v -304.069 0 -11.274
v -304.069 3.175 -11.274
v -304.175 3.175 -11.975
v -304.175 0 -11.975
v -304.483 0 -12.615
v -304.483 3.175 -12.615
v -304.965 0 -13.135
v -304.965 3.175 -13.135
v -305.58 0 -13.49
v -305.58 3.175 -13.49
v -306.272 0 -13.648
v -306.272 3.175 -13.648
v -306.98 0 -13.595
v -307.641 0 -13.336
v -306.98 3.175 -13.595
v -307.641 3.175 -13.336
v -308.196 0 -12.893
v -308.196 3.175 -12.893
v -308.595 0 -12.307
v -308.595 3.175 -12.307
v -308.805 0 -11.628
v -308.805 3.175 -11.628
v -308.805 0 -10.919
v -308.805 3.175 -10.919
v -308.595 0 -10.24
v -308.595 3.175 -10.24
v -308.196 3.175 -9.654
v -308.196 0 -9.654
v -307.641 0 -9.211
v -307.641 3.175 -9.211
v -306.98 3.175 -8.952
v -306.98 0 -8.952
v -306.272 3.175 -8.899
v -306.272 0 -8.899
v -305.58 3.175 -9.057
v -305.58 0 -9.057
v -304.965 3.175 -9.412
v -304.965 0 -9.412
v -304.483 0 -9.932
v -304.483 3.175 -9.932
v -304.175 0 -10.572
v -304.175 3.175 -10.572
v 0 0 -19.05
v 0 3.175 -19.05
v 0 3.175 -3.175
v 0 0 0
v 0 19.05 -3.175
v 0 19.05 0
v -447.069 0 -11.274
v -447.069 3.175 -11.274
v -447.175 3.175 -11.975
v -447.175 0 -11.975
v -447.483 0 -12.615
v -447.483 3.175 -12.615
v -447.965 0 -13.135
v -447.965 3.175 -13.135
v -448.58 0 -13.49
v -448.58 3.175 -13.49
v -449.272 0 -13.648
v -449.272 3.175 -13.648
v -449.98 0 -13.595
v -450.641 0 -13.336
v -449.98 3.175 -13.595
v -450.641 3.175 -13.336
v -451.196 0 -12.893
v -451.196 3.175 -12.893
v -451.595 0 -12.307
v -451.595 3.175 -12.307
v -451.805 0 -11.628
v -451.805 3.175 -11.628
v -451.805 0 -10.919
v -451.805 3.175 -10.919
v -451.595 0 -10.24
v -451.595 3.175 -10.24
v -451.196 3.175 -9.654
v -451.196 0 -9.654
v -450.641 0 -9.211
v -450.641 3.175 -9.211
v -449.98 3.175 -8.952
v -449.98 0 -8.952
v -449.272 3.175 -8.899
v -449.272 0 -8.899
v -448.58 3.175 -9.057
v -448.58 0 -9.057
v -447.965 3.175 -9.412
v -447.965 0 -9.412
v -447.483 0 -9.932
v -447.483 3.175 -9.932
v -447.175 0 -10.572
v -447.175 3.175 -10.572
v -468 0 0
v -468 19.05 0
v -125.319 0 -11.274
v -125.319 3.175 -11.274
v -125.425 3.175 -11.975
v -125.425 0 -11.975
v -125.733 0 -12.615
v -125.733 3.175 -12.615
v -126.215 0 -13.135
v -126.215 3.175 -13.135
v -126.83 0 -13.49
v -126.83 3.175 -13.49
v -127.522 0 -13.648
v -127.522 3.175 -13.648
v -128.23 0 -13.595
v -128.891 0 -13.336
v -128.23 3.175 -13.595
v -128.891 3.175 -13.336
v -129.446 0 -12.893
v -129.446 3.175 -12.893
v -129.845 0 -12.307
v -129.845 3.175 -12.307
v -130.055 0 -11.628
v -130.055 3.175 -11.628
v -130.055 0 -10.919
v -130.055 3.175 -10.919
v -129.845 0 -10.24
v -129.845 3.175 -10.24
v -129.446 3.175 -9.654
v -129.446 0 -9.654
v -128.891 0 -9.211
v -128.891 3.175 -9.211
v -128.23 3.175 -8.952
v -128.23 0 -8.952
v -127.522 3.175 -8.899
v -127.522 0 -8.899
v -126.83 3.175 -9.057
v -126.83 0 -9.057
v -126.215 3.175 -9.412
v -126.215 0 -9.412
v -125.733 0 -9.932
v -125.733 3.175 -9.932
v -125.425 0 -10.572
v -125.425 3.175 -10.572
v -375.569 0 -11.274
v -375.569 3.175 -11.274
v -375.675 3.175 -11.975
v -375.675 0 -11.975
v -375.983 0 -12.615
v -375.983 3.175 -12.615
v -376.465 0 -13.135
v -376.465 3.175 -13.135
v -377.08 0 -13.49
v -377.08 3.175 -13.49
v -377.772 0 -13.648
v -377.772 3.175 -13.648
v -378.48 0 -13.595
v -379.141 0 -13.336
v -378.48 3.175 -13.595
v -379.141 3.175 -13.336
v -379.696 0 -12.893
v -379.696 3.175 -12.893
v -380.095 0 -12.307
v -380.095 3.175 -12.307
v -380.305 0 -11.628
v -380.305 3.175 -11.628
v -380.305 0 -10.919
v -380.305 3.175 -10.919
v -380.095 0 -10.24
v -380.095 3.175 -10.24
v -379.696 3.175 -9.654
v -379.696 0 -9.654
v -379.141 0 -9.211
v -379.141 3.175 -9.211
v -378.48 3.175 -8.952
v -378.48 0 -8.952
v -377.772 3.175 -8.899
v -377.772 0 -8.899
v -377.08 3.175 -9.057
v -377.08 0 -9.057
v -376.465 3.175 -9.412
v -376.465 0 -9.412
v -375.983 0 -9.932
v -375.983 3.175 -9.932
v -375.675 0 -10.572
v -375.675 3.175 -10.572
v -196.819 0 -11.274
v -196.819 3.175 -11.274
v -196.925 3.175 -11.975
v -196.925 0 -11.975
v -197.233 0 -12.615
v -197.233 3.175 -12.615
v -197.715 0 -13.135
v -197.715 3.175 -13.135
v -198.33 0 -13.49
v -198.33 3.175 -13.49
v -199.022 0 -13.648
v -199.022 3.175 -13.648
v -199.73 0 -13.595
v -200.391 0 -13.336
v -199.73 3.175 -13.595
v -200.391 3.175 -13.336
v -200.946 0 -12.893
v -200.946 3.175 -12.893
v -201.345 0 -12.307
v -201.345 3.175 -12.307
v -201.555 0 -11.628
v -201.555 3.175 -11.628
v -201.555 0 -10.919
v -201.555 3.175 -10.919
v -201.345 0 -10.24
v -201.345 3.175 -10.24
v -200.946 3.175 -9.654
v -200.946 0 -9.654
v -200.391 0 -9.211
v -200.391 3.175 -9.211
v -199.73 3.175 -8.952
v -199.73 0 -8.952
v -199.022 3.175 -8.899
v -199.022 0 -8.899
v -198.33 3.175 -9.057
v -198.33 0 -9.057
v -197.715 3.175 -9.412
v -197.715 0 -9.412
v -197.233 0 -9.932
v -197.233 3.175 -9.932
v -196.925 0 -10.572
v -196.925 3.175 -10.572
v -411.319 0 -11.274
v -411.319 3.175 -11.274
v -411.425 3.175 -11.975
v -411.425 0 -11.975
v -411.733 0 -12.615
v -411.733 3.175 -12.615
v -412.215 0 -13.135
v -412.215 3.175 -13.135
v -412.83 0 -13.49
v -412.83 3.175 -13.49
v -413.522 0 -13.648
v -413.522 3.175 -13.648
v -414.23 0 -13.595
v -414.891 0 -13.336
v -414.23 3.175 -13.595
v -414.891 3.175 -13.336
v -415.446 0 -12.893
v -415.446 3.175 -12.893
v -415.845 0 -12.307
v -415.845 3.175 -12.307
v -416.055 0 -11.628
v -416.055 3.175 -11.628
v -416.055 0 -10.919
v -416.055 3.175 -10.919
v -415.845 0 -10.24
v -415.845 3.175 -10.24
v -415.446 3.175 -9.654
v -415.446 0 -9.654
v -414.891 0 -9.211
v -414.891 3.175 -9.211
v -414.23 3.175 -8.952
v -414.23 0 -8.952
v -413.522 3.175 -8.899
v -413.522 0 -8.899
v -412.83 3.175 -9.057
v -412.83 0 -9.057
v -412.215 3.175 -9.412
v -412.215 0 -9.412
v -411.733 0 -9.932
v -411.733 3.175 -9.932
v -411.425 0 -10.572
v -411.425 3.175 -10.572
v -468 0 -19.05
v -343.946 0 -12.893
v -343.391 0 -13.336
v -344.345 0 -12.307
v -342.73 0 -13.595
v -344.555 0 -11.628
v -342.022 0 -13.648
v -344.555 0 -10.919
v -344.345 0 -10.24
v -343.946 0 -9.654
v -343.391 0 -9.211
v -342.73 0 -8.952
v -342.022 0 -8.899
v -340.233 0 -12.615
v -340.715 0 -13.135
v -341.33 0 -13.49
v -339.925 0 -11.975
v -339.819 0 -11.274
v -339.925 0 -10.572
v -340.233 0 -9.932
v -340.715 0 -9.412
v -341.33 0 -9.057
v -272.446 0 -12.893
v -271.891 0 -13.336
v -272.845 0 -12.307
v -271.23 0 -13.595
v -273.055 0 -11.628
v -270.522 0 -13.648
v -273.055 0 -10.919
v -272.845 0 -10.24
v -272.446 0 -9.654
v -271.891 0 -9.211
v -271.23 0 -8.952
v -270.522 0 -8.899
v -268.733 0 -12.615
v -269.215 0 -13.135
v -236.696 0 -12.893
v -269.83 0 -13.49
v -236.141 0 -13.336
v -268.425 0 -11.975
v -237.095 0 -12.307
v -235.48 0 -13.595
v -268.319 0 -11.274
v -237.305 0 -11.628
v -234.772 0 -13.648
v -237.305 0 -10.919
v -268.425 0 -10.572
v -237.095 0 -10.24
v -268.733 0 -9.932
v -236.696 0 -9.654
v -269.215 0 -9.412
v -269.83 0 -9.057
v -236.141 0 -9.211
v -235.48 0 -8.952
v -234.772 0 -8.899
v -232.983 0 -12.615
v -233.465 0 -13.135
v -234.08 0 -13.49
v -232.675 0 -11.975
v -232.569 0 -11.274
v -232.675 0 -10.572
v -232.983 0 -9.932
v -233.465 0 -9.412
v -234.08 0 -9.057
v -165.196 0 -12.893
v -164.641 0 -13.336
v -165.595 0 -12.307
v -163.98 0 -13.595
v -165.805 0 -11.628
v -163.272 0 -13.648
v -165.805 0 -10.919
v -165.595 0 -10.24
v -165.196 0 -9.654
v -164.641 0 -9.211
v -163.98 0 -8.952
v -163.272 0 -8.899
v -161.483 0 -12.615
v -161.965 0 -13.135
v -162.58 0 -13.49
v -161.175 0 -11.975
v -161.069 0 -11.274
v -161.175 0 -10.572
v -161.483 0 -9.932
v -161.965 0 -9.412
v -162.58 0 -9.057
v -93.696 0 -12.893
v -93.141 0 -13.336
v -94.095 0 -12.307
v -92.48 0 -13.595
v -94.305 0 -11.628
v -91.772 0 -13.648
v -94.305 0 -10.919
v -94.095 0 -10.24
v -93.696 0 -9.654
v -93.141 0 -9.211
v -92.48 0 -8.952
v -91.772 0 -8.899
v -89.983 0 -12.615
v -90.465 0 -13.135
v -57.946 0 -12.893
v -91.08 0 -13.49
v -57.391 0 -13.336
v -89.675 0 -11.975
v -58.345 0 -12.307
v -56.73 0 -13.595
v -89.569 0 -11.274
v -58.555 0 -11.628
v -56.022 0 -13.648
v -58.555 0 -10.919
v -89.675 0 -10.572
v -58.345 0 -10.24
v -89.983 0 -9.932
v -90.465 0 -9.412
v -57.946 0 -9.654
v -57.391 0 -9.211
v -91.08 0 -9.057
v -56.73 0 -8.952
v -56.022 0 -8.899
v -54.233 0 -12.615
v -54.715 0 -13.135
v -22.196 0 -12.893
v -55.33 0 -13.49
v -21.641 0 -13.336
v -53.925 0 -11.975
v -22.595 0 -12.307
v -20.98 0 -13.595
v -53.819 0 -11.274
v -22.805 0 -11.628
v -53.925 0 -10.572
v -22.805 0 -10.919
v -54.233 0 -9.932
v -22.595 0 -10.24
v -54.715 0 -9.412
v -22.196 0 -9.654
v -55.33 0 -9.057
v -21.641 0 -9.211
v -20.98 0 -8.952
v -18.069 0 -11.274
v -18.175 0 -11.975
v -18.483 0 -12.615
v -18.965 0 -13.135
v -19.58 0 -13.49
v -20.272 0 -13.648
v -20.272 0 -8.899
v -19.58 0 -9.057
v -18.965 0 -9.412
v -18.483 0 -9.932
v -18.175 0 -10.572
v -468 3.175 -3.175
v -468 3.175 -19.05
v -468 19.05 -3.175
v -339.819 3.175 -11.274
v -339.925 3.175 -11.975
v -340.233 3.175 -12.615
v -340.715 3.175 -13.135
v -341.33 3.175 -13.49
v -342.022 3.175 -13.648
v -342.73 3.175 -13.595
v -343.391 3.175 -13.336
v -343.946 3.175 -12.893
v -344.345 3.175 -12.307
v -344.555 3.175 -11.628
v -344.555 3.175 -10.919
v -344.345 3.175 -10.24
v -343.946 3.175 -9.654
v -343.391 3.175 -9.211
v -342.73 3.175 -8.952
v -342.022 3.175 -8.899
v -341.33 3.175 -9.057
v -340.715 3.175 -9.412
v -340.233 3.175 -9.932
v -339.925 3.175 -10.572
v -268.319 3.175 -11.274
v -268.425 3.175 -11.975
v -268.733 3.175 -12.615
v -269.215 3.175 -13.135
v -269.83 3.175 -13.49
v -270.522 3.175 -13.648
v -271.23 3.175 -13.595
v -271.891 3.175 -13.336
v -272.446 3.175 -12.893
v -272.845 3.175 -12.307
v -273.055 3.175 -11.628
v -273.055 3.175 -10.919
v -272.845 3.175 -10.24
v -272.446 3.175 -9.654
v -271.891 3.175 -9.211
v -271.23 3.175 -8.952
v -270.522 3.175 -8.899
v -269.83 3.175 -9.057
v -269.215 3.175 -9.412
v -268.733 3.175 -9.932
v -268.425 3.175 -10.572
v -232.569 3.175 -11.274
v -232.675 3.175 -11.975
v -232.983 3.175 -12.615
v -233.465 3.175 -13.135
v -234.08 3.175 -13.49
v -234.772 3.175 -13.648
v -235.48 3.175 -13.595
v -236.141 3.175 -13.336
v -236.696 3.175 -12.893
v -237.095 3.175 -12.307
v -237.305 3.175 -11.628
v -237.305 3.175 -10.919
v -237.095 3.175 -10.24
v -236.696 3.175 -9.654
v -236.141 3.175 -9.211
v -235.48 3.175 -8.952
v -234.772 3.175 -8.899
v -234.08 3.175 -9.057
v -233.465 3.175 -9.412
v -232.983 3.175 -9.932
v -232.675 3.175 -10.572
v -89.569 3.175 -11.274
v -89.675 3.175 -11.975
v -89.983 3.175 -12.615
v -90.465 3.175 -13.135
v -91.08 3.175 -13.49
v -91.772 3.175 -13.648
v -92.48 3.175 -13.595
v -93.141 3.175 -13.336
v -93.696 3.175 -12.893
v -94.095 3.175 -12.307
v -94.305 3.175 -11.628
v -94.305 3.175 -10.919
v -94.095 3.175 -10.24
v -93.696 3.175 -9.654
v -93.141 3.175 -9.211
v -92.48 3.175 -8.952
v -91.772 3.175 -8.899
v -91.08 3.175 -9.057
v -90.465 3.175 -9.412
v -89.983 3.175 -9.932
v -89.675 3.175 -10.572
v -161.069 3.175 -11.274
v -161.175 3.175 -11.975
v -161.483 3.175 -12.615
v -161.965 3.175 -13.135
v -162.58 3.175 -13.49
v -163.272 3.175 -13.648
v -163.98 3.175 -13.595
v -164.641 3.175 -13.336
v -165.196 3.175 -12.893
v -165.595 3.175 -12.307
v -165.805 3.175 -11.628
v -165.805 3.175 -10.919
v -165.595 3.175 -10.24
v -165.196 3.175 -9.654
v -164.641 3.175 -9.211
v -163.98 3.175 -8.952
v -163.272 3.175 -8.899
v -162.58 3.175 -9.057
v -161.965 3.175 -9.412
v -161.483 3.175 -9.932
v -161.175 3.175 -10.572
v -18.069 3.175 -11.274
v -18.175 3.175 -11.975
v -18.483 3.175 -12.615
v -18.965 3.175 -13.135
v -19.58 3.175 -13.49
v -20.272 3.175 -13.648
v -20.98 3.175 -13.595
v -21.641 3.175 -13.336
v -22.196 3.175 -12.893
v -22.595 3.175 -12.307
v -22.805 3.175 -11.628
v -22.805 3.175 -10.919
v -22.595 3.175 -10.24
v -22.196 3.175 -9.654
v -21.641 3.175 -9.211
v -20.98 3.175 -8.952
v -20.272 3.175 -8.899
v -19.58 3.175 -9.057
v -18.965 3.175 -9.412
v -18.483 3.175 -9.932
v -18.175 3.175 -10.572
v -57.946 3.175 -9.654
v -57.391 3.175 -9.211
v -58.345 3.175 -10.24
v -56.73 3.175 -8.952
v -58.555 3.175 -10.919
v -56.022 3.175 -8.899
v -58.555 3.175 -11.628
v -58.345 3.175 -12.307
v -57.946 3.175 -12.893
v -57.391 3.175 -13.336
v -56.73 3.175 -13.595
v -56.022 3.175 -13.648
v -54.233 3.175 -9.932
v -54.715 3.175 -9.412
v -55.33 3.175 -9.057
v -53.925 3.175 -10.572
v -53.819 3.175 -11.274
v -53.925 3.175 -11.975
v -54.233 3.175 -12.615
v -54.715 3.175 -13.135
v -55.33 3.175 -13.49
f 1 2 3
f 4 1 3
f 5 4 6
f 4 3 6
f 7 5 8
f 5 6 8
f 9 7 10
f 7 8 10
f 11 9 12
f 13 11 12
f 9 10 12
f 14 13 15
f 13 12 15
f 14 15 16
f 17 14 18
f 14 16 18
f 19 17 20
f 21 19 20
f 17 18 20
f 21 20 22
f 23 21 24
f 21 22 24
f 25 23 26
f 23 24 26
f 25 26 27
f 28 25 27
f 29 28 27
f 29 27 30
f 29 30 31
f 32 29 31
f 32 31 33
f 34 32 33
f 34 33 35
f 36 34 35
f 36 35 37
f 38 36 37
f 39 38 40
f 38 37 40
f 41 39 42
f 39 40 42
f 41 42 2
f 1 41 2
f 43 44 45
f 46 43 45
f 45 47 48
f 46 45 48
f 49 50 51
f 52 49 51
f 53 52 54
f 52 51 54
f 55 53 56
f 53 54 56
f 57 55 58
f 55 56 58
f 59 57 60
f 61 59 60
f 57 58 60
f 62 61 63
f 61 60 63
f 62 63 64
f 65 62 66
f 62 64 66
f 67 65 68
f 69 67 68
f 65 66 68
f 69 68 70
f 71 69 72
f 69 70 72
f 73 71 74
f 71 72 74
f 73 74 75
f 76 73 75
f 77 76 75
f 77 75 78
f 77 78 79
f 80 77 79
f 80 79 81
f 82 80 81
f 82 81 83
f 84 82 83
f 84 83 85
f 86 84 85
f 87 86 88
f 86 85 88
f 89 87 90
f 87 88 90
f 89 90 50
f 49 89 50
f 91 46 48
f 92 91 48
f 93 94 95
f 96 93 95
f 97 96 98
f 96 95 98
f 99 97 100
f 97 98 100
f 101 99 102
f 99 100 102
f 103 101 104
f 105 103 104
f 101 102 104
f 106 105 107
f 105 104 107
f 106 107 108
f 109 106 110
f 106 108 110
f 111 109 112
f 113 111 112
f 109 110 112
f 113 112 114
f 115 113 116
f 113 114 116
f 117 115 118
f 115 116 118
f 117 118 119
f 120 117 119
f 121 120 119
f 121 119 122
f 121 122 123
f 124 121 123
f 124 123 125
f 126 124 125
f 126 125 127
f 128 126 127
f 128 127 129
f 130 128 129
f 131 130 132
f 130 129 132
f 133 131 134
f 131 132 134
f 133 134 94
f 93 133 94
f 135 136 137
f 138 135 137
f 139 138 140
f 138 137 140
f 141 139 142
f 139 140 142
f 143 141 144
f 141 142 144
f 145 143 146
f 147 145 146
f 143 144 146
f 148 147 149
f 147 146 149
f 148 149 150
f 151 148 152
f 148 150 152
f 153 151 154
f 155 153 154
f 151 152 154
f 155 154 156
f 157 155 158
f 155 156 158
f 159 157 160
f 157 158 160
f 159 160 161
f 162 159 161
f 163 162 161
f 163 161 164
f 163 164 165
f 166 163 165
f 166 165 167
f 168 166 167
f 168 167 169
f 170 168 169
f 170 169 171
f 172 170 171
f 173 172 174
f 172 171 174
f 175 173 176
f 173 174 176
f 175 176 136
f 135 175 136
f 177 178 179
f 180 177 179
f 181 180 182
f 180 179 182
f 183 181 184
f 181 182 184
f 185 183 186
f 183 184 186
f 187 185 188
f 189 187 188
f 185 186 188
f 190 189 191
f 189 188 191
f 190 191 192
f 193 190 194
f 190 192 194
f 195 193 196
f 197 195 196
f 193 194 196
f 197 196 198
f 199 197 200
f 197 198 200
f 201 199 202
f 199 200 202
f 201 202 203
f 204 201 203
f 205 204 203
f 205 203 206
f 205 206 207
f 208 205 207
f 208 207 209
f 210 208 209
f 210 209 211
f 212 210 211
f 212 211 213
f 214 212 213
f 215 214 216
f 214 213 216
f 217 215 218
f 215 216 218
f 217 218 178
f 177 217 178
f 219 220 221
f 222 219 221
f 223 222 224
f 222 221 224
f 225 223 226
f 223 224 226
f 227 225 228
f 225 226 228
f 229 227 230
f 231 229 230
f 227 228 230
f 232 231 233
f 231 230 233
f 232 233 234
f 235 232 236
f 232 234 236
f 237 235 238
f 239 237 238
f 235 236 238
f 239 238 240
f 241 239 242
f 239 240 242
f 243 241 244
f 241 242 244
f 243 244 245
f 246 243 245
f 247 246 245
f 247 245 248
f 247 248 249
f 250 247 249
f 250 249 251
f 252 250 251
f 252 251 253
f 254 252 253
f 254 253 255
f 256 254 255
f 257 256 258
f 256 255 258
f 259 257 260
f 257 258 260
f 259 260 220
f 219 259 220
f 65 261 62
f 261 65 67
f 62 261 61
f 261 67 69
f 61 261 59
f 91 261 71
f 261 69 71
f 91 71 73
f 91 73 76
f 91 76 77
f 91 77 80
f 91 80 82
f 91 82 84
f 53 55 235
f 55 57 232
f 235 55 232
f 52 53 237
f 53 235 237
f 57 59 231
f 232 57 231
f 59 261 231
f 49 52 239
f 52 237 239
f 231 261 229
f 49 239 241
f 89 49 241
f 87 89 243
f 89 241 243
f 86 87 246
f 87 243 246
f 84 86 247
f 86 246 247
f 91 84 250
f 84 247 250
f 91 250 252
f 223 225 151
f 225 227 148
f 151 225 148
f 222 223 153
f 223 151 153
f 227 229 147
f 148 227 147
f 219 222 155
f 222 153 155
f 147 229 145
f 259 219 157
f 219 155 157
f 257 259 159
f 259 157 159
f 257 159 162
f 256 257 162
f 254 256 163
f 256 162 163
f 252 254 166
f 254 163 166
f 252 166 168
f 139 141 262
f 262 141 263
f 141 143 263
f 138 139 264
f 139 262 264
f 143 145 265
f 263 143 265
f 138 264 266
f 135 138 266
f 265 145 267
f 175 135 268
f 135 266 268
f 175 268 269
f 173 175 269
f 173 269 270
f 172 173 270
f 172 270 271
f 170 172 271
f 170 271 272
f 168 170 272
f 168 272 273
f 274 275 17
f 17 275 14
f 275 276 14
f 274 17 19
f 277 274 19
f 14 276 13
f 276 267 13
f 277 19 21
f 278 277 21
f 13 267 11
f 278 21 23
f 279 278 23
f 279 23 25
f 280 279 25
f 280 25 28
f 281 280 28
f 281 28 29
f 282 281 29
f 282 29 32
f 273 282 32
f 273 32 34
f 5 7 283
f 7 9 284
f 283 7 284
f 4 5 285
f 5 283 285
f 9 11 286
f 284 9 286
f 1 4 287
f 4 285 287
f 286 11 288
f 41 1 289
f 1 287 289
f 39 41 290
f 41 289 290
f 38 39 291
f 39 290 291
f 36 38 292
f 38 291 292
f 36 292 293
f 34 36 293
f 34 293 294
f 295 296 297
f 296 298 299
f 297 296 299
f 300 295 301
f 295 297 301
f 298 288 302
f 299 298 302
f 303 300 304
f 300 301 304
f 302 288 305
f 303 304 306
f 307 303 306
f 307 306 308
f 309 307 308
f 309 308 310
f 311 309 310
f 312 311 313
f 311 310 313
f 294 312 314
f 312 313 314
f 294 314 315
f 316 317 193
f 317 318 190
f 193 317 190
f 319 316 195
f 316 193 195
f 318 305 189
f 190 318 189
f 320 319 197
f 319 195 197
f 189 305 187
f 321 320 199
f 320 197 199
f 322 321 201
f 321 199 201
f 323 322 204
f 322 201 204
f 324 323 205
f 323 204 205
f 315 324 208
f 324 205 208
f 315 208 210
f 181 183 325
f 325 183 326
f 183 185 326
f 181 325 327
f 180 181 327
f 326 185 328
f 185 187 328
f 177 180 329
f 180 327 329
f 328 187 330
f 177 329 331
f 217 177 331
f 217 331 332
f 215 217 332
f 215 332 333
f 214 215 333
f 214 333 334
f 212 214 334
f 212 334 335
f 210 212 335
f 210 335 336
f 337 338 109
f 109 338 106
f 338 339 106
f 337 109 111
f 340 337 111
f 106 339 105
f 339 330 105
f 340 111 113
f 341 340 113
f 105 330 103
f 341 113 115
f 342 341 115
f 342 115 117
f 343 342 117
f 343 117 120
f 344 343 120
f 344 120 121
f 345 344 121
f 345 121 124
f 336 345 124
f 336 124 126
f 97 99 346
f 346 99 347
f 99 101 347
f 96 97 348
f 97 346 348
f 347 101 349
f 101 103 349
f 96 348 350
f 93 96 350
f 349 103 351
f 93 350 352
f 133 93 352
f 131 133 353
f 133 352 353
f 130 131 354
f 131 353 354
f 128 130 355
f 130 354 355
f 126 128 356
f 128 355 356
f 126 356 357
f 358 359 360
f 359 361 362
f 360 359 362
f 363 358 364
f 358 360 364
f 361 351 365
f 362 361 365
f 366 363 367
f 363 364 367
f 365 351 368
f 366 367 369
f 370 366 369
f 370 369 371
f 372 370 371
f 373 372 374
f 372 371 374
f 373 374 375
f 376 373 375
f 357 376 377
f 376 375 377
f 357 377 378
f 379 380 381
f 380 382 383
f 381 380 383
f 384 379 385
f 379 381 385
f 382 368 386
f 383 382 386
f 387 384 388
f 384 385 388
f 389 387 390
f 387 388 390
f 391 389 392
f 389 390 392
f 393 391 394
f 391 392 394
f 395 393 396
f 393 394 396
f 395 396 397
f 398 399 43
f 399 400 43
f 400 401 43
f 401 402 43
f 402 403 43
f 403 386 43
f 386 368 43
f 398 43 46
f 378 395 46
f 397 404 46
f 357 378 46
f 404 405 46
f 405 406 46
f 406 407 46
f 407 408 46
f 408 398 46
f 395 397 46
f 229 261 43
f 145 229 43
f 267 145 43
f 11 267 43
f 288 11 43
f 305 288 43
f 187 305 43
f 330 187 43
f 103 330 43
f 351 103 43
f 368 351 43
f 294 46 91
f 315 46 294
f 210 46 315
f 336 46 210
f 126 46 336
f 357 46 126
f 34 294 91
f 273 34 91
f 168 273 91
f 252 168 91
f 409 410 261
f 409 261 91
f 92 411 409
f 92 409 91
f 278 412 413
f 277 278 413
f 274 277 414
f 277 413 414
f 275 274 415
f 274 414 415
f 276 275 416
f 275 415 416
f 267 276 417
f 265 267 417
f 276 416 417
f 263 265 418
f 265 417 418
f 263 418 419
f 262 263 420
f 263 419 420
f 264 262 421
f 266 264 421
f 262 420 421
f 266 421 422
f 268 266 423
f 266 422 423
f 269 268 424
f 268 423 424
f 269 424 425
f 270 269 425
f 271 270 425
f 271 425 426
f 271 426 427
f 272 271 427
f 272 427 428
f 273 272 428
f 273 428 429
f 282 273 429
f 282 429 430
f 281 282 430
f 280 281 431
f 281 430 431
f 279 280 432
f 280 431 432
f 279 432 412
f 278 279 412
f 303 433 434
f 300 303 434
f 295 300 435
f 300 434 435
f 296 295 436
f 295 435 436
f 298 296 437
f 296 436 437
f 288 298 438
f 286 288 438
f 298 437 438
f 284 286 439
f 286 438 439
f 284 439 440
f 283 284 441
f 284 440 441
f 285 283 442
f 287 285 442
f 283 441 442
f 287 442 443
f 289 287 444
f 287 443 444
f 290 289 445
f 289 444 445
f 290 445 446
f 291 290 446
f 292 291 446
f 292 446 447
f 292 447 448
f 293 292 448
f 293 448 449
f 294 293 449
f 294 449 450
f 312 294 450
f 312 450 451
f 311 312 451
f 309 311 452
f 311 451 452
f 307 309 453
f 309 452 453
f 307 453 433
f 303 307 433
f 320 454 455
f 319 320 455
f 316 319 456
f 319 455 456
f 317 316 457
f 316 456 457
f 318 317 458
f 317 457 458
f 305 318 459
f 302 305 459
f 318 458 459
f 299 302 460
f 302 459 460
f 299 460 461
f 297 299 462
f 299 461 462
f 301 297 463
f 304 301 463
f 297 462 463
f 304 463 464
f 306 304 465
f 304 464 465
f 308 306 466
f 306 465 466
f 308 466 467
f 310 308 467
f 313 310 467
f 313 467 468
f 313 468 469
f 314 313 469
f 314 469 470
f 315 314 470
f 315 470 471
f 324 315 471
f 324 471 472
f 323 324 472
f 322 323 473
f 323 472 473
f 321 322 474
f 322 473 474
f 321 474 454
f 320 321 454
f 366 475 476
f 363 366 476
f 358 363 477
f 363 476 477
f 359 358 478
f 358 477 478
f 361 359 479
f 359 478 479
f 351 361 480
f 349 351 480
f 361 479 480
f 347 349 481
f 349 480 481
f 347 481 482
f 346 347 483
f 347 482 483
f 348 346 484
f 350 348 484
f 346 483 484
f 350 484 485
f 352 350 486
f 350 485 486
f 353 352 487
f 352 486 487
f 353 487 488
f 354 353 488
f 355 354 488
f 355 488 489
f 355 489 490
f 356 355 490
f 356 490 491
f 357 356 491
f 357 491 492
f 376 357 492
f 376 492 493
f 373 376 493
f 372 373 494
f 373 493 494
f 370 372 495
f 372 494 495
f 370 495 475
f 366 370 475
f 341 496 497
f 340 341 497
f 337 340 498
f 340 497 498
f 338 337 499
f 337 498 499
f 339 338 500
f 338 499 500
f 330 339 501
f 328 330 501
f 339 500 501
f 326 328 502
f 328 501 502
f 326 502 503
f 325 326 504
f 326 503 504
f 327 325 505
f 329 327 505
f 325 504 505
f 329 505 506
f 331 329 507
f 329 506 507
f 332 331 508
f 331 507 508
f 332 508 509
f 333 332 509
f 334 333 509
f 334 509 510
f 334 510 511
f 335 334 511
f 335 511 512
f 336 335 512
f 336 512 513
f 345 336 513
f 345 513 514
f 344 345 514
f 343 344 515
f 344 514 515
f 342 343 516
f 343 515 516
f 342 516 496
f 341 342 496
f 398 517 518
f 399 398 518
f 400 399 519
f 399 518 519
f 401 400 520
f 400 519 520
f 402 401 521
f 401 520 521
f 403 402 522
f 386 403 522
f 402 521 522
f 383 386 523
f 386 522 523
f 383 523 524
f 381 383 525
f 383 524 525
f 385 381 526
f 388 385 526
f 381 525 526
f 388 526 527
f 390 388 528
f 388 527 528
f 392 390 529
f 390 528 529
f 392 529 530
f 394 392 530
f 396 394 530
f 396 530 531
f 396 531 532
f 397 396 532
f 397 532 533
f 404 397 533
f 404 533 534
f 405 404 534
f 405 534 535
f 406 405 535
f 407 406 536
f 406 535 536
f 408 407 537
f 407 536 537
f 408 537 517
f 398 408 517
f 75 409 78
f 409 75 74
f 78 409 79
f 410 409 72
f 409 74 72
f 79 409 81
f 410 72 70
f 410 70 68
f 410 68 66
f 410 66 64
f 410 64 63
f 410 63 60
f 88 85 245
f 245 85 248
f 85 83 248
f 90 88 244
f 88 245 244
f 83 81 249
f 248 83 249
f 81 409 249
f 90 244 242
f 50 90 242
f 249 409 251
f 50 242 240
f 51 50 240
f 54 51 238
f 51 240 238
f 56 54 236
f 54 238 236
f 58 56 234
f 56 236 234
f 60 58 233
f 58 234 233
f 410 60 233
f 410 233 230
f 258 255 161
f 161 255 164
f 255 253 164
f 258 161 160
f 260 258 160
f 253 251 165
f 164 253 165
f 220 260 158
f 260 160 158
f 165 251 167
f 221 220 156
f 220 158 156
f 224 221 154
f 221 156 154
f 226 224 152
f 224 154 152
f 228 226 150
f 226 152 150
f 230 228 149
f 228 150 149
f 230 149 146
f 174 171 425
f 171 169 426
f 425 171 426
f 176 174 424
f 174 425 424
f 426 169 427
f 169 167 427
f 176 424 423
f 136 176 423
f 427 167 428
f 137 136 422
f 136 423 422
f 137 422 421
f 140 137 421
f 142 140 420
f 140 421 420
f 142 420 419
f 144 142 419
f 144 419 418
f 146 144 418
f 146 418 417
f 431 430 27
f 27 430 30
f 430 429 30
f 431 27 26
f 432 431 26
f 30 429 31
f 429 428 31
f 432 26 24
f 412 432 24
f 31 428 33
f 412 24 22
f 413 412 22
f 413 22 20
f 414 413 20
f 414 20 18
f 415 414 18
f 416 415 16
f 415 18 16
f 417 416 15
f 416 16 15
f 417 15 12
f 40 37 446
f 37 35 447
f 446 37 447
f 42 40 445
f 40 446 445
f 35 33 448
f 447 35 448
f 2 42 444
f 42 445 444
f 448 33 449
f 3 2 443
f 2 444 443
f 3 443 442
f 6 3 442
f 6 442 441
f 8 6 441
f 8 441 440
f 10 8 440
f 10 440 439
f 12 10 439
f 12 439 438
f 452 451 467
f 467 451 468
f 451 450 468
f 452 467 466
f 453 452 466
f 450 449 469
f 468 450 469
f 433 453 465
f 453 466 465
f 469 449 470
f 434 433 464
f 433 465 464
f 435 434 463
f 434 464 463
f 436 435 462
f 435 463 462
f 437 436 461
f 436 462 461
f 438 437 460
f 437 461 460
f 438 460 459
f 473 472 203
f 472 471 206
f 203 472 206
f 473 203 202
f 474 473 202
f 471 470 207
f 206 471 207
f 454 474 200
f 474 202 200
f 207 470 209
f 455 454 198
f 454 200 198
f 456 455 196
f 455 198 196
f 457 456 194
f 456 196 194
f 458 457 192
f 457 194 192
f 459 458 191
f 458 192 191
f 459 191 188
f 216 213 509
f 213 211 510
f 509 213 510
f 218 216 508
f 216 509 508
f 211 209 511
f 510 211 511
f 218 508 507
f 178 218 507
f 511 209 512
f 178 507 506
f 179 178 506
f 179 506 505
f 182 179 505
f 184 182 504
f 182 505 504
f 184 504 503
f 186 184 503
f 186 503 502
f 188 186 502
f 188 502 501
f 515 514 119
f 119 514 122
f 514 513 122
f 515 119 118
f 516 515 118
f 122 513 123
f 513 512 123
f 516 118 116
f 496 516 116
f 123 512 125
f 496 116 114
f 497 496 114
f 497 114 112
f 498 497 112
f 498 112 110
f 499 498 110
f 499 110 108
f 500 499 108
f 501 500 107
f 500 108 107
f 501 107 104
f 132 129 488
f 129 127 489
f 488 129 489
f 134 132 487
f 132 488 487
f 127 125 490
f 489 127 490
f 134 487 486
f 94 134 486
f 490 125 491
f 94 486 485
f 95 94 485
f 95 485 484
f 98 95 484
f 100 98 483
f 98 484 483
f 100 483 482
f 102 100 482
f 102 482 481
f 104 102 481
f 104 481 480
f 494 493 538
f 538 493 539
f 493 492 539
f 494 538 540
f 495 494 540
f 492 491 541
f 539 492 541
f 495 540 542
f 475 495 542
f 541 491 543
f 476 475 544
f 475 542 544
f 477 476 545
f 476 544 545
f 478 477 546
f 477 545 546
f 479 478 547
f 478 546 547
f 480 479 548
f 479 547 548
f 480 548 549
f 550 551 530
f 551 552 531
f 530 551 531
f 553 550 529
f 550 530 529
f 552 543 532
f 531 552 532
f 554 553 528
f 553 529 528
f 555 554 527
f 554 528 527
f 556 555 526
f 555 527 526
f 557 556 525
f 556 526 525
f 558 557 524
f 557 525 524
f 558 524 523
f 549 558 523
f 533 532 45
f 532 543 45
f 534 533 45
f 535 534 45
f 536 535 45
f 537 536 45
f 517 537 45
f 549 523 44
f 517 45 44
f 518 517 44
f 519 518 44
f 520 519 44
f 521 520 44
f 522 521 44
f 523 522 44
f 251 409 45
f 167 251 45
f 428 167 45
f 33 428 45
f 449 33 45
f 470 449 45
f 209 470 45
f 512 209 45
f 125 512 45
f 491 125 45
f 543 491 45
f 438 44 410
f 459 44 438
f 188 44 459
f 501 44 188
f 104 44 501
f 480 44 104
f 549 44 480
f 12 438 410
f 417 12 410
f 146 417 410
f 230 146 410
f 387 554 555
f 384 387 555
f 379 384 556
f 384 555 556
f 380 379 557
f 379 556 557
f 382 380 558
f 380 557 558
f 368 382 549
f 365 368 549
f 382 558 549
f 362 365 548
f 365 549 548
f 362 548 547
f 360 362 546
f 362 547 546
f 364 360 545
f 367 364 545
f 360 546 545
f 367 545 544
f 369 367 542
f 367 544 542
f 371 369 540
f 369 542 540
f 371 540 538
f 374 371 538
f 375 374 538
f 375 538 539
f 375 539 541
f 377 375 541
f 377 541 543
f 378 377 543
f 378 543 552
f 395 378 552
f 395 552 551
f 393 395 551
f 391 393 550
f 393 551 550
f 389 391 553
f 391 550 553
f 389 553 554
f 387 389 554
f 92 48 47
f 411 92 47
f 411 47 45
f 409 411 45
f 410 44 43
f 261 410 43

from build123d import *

# Parameters (mm, degrees)
BOSS_EXTRUDE1_DEPTH = 468
SKETCH2_R           = 2.38125
CUT_EXTRUDE1_DEPTH  = 3.175


with BuildPart() as part:
    # Sketch1 → Boss-Extrude1 (new body)
    with BuildSketch(Plane(origin=(0, 0, 0), x_dir=(0, 0, -1), z_dir=(1, 0, 0))):
        Polygon((0, 0), (0, 19.05), (3.175, 19.05), (3.175, 3.175), (19.05, 3.175), (19.05, 0), align=None)
    extrude(amount=-BOSS_EXTRUDE1_DEPTH)

    # Sketch2 → Cut-Extrude1 (cut)
    with BuildSketch(Plane(origin=(0, 3.175, 0), x_dir=(1, 0, 0), z_dir=(0, 1, 0))):
        with Locations((-20.45, 11.273546723)):
            Circle(SKETCH2_R)
        with Locations((-56.2, 11.273546723)):
            Circle(SKETCH2_R)
        with Locations((-91.95, 11.273546723)):
            Circle(SKETCH2_R)
        with Locations((-127.7, 11.273546723)):
            Circle(SKETCH2_R)
        with Locations((-163.45, 11.273546723)):
            Circle(SKETCH2_R)
        with Locations((-199.2, 11.273546723)):
            Circle(SKETCH2_R)
        with Locations((-234.95, 11.273546723)):
            Circle(SKETCH2_R)
        with Locations((-270.7, 11.273546723)):
            Circle(SKETCH2_R)
        with Locations((-306.45, 11.273546723)):
            Circle(SKETCH2_R)
        with Locations((-342.2, 11.273546723)):
            Circle(SKETCH2_R)
        with Locations((-377.95, 11.273546723)):
            Circle(SKETCH2_R)
        with Locations((-413.7, 11.273546723)):
            Circle(SKETCH2_R)
        with Locations((-449.45, 11.273546723)):
            Circle(SKETCH2_R)
    extrude(amount=-CUT_EXTRUDE1_DEPTH, mode=Mode.SUBTRACT)


solid = part.part
